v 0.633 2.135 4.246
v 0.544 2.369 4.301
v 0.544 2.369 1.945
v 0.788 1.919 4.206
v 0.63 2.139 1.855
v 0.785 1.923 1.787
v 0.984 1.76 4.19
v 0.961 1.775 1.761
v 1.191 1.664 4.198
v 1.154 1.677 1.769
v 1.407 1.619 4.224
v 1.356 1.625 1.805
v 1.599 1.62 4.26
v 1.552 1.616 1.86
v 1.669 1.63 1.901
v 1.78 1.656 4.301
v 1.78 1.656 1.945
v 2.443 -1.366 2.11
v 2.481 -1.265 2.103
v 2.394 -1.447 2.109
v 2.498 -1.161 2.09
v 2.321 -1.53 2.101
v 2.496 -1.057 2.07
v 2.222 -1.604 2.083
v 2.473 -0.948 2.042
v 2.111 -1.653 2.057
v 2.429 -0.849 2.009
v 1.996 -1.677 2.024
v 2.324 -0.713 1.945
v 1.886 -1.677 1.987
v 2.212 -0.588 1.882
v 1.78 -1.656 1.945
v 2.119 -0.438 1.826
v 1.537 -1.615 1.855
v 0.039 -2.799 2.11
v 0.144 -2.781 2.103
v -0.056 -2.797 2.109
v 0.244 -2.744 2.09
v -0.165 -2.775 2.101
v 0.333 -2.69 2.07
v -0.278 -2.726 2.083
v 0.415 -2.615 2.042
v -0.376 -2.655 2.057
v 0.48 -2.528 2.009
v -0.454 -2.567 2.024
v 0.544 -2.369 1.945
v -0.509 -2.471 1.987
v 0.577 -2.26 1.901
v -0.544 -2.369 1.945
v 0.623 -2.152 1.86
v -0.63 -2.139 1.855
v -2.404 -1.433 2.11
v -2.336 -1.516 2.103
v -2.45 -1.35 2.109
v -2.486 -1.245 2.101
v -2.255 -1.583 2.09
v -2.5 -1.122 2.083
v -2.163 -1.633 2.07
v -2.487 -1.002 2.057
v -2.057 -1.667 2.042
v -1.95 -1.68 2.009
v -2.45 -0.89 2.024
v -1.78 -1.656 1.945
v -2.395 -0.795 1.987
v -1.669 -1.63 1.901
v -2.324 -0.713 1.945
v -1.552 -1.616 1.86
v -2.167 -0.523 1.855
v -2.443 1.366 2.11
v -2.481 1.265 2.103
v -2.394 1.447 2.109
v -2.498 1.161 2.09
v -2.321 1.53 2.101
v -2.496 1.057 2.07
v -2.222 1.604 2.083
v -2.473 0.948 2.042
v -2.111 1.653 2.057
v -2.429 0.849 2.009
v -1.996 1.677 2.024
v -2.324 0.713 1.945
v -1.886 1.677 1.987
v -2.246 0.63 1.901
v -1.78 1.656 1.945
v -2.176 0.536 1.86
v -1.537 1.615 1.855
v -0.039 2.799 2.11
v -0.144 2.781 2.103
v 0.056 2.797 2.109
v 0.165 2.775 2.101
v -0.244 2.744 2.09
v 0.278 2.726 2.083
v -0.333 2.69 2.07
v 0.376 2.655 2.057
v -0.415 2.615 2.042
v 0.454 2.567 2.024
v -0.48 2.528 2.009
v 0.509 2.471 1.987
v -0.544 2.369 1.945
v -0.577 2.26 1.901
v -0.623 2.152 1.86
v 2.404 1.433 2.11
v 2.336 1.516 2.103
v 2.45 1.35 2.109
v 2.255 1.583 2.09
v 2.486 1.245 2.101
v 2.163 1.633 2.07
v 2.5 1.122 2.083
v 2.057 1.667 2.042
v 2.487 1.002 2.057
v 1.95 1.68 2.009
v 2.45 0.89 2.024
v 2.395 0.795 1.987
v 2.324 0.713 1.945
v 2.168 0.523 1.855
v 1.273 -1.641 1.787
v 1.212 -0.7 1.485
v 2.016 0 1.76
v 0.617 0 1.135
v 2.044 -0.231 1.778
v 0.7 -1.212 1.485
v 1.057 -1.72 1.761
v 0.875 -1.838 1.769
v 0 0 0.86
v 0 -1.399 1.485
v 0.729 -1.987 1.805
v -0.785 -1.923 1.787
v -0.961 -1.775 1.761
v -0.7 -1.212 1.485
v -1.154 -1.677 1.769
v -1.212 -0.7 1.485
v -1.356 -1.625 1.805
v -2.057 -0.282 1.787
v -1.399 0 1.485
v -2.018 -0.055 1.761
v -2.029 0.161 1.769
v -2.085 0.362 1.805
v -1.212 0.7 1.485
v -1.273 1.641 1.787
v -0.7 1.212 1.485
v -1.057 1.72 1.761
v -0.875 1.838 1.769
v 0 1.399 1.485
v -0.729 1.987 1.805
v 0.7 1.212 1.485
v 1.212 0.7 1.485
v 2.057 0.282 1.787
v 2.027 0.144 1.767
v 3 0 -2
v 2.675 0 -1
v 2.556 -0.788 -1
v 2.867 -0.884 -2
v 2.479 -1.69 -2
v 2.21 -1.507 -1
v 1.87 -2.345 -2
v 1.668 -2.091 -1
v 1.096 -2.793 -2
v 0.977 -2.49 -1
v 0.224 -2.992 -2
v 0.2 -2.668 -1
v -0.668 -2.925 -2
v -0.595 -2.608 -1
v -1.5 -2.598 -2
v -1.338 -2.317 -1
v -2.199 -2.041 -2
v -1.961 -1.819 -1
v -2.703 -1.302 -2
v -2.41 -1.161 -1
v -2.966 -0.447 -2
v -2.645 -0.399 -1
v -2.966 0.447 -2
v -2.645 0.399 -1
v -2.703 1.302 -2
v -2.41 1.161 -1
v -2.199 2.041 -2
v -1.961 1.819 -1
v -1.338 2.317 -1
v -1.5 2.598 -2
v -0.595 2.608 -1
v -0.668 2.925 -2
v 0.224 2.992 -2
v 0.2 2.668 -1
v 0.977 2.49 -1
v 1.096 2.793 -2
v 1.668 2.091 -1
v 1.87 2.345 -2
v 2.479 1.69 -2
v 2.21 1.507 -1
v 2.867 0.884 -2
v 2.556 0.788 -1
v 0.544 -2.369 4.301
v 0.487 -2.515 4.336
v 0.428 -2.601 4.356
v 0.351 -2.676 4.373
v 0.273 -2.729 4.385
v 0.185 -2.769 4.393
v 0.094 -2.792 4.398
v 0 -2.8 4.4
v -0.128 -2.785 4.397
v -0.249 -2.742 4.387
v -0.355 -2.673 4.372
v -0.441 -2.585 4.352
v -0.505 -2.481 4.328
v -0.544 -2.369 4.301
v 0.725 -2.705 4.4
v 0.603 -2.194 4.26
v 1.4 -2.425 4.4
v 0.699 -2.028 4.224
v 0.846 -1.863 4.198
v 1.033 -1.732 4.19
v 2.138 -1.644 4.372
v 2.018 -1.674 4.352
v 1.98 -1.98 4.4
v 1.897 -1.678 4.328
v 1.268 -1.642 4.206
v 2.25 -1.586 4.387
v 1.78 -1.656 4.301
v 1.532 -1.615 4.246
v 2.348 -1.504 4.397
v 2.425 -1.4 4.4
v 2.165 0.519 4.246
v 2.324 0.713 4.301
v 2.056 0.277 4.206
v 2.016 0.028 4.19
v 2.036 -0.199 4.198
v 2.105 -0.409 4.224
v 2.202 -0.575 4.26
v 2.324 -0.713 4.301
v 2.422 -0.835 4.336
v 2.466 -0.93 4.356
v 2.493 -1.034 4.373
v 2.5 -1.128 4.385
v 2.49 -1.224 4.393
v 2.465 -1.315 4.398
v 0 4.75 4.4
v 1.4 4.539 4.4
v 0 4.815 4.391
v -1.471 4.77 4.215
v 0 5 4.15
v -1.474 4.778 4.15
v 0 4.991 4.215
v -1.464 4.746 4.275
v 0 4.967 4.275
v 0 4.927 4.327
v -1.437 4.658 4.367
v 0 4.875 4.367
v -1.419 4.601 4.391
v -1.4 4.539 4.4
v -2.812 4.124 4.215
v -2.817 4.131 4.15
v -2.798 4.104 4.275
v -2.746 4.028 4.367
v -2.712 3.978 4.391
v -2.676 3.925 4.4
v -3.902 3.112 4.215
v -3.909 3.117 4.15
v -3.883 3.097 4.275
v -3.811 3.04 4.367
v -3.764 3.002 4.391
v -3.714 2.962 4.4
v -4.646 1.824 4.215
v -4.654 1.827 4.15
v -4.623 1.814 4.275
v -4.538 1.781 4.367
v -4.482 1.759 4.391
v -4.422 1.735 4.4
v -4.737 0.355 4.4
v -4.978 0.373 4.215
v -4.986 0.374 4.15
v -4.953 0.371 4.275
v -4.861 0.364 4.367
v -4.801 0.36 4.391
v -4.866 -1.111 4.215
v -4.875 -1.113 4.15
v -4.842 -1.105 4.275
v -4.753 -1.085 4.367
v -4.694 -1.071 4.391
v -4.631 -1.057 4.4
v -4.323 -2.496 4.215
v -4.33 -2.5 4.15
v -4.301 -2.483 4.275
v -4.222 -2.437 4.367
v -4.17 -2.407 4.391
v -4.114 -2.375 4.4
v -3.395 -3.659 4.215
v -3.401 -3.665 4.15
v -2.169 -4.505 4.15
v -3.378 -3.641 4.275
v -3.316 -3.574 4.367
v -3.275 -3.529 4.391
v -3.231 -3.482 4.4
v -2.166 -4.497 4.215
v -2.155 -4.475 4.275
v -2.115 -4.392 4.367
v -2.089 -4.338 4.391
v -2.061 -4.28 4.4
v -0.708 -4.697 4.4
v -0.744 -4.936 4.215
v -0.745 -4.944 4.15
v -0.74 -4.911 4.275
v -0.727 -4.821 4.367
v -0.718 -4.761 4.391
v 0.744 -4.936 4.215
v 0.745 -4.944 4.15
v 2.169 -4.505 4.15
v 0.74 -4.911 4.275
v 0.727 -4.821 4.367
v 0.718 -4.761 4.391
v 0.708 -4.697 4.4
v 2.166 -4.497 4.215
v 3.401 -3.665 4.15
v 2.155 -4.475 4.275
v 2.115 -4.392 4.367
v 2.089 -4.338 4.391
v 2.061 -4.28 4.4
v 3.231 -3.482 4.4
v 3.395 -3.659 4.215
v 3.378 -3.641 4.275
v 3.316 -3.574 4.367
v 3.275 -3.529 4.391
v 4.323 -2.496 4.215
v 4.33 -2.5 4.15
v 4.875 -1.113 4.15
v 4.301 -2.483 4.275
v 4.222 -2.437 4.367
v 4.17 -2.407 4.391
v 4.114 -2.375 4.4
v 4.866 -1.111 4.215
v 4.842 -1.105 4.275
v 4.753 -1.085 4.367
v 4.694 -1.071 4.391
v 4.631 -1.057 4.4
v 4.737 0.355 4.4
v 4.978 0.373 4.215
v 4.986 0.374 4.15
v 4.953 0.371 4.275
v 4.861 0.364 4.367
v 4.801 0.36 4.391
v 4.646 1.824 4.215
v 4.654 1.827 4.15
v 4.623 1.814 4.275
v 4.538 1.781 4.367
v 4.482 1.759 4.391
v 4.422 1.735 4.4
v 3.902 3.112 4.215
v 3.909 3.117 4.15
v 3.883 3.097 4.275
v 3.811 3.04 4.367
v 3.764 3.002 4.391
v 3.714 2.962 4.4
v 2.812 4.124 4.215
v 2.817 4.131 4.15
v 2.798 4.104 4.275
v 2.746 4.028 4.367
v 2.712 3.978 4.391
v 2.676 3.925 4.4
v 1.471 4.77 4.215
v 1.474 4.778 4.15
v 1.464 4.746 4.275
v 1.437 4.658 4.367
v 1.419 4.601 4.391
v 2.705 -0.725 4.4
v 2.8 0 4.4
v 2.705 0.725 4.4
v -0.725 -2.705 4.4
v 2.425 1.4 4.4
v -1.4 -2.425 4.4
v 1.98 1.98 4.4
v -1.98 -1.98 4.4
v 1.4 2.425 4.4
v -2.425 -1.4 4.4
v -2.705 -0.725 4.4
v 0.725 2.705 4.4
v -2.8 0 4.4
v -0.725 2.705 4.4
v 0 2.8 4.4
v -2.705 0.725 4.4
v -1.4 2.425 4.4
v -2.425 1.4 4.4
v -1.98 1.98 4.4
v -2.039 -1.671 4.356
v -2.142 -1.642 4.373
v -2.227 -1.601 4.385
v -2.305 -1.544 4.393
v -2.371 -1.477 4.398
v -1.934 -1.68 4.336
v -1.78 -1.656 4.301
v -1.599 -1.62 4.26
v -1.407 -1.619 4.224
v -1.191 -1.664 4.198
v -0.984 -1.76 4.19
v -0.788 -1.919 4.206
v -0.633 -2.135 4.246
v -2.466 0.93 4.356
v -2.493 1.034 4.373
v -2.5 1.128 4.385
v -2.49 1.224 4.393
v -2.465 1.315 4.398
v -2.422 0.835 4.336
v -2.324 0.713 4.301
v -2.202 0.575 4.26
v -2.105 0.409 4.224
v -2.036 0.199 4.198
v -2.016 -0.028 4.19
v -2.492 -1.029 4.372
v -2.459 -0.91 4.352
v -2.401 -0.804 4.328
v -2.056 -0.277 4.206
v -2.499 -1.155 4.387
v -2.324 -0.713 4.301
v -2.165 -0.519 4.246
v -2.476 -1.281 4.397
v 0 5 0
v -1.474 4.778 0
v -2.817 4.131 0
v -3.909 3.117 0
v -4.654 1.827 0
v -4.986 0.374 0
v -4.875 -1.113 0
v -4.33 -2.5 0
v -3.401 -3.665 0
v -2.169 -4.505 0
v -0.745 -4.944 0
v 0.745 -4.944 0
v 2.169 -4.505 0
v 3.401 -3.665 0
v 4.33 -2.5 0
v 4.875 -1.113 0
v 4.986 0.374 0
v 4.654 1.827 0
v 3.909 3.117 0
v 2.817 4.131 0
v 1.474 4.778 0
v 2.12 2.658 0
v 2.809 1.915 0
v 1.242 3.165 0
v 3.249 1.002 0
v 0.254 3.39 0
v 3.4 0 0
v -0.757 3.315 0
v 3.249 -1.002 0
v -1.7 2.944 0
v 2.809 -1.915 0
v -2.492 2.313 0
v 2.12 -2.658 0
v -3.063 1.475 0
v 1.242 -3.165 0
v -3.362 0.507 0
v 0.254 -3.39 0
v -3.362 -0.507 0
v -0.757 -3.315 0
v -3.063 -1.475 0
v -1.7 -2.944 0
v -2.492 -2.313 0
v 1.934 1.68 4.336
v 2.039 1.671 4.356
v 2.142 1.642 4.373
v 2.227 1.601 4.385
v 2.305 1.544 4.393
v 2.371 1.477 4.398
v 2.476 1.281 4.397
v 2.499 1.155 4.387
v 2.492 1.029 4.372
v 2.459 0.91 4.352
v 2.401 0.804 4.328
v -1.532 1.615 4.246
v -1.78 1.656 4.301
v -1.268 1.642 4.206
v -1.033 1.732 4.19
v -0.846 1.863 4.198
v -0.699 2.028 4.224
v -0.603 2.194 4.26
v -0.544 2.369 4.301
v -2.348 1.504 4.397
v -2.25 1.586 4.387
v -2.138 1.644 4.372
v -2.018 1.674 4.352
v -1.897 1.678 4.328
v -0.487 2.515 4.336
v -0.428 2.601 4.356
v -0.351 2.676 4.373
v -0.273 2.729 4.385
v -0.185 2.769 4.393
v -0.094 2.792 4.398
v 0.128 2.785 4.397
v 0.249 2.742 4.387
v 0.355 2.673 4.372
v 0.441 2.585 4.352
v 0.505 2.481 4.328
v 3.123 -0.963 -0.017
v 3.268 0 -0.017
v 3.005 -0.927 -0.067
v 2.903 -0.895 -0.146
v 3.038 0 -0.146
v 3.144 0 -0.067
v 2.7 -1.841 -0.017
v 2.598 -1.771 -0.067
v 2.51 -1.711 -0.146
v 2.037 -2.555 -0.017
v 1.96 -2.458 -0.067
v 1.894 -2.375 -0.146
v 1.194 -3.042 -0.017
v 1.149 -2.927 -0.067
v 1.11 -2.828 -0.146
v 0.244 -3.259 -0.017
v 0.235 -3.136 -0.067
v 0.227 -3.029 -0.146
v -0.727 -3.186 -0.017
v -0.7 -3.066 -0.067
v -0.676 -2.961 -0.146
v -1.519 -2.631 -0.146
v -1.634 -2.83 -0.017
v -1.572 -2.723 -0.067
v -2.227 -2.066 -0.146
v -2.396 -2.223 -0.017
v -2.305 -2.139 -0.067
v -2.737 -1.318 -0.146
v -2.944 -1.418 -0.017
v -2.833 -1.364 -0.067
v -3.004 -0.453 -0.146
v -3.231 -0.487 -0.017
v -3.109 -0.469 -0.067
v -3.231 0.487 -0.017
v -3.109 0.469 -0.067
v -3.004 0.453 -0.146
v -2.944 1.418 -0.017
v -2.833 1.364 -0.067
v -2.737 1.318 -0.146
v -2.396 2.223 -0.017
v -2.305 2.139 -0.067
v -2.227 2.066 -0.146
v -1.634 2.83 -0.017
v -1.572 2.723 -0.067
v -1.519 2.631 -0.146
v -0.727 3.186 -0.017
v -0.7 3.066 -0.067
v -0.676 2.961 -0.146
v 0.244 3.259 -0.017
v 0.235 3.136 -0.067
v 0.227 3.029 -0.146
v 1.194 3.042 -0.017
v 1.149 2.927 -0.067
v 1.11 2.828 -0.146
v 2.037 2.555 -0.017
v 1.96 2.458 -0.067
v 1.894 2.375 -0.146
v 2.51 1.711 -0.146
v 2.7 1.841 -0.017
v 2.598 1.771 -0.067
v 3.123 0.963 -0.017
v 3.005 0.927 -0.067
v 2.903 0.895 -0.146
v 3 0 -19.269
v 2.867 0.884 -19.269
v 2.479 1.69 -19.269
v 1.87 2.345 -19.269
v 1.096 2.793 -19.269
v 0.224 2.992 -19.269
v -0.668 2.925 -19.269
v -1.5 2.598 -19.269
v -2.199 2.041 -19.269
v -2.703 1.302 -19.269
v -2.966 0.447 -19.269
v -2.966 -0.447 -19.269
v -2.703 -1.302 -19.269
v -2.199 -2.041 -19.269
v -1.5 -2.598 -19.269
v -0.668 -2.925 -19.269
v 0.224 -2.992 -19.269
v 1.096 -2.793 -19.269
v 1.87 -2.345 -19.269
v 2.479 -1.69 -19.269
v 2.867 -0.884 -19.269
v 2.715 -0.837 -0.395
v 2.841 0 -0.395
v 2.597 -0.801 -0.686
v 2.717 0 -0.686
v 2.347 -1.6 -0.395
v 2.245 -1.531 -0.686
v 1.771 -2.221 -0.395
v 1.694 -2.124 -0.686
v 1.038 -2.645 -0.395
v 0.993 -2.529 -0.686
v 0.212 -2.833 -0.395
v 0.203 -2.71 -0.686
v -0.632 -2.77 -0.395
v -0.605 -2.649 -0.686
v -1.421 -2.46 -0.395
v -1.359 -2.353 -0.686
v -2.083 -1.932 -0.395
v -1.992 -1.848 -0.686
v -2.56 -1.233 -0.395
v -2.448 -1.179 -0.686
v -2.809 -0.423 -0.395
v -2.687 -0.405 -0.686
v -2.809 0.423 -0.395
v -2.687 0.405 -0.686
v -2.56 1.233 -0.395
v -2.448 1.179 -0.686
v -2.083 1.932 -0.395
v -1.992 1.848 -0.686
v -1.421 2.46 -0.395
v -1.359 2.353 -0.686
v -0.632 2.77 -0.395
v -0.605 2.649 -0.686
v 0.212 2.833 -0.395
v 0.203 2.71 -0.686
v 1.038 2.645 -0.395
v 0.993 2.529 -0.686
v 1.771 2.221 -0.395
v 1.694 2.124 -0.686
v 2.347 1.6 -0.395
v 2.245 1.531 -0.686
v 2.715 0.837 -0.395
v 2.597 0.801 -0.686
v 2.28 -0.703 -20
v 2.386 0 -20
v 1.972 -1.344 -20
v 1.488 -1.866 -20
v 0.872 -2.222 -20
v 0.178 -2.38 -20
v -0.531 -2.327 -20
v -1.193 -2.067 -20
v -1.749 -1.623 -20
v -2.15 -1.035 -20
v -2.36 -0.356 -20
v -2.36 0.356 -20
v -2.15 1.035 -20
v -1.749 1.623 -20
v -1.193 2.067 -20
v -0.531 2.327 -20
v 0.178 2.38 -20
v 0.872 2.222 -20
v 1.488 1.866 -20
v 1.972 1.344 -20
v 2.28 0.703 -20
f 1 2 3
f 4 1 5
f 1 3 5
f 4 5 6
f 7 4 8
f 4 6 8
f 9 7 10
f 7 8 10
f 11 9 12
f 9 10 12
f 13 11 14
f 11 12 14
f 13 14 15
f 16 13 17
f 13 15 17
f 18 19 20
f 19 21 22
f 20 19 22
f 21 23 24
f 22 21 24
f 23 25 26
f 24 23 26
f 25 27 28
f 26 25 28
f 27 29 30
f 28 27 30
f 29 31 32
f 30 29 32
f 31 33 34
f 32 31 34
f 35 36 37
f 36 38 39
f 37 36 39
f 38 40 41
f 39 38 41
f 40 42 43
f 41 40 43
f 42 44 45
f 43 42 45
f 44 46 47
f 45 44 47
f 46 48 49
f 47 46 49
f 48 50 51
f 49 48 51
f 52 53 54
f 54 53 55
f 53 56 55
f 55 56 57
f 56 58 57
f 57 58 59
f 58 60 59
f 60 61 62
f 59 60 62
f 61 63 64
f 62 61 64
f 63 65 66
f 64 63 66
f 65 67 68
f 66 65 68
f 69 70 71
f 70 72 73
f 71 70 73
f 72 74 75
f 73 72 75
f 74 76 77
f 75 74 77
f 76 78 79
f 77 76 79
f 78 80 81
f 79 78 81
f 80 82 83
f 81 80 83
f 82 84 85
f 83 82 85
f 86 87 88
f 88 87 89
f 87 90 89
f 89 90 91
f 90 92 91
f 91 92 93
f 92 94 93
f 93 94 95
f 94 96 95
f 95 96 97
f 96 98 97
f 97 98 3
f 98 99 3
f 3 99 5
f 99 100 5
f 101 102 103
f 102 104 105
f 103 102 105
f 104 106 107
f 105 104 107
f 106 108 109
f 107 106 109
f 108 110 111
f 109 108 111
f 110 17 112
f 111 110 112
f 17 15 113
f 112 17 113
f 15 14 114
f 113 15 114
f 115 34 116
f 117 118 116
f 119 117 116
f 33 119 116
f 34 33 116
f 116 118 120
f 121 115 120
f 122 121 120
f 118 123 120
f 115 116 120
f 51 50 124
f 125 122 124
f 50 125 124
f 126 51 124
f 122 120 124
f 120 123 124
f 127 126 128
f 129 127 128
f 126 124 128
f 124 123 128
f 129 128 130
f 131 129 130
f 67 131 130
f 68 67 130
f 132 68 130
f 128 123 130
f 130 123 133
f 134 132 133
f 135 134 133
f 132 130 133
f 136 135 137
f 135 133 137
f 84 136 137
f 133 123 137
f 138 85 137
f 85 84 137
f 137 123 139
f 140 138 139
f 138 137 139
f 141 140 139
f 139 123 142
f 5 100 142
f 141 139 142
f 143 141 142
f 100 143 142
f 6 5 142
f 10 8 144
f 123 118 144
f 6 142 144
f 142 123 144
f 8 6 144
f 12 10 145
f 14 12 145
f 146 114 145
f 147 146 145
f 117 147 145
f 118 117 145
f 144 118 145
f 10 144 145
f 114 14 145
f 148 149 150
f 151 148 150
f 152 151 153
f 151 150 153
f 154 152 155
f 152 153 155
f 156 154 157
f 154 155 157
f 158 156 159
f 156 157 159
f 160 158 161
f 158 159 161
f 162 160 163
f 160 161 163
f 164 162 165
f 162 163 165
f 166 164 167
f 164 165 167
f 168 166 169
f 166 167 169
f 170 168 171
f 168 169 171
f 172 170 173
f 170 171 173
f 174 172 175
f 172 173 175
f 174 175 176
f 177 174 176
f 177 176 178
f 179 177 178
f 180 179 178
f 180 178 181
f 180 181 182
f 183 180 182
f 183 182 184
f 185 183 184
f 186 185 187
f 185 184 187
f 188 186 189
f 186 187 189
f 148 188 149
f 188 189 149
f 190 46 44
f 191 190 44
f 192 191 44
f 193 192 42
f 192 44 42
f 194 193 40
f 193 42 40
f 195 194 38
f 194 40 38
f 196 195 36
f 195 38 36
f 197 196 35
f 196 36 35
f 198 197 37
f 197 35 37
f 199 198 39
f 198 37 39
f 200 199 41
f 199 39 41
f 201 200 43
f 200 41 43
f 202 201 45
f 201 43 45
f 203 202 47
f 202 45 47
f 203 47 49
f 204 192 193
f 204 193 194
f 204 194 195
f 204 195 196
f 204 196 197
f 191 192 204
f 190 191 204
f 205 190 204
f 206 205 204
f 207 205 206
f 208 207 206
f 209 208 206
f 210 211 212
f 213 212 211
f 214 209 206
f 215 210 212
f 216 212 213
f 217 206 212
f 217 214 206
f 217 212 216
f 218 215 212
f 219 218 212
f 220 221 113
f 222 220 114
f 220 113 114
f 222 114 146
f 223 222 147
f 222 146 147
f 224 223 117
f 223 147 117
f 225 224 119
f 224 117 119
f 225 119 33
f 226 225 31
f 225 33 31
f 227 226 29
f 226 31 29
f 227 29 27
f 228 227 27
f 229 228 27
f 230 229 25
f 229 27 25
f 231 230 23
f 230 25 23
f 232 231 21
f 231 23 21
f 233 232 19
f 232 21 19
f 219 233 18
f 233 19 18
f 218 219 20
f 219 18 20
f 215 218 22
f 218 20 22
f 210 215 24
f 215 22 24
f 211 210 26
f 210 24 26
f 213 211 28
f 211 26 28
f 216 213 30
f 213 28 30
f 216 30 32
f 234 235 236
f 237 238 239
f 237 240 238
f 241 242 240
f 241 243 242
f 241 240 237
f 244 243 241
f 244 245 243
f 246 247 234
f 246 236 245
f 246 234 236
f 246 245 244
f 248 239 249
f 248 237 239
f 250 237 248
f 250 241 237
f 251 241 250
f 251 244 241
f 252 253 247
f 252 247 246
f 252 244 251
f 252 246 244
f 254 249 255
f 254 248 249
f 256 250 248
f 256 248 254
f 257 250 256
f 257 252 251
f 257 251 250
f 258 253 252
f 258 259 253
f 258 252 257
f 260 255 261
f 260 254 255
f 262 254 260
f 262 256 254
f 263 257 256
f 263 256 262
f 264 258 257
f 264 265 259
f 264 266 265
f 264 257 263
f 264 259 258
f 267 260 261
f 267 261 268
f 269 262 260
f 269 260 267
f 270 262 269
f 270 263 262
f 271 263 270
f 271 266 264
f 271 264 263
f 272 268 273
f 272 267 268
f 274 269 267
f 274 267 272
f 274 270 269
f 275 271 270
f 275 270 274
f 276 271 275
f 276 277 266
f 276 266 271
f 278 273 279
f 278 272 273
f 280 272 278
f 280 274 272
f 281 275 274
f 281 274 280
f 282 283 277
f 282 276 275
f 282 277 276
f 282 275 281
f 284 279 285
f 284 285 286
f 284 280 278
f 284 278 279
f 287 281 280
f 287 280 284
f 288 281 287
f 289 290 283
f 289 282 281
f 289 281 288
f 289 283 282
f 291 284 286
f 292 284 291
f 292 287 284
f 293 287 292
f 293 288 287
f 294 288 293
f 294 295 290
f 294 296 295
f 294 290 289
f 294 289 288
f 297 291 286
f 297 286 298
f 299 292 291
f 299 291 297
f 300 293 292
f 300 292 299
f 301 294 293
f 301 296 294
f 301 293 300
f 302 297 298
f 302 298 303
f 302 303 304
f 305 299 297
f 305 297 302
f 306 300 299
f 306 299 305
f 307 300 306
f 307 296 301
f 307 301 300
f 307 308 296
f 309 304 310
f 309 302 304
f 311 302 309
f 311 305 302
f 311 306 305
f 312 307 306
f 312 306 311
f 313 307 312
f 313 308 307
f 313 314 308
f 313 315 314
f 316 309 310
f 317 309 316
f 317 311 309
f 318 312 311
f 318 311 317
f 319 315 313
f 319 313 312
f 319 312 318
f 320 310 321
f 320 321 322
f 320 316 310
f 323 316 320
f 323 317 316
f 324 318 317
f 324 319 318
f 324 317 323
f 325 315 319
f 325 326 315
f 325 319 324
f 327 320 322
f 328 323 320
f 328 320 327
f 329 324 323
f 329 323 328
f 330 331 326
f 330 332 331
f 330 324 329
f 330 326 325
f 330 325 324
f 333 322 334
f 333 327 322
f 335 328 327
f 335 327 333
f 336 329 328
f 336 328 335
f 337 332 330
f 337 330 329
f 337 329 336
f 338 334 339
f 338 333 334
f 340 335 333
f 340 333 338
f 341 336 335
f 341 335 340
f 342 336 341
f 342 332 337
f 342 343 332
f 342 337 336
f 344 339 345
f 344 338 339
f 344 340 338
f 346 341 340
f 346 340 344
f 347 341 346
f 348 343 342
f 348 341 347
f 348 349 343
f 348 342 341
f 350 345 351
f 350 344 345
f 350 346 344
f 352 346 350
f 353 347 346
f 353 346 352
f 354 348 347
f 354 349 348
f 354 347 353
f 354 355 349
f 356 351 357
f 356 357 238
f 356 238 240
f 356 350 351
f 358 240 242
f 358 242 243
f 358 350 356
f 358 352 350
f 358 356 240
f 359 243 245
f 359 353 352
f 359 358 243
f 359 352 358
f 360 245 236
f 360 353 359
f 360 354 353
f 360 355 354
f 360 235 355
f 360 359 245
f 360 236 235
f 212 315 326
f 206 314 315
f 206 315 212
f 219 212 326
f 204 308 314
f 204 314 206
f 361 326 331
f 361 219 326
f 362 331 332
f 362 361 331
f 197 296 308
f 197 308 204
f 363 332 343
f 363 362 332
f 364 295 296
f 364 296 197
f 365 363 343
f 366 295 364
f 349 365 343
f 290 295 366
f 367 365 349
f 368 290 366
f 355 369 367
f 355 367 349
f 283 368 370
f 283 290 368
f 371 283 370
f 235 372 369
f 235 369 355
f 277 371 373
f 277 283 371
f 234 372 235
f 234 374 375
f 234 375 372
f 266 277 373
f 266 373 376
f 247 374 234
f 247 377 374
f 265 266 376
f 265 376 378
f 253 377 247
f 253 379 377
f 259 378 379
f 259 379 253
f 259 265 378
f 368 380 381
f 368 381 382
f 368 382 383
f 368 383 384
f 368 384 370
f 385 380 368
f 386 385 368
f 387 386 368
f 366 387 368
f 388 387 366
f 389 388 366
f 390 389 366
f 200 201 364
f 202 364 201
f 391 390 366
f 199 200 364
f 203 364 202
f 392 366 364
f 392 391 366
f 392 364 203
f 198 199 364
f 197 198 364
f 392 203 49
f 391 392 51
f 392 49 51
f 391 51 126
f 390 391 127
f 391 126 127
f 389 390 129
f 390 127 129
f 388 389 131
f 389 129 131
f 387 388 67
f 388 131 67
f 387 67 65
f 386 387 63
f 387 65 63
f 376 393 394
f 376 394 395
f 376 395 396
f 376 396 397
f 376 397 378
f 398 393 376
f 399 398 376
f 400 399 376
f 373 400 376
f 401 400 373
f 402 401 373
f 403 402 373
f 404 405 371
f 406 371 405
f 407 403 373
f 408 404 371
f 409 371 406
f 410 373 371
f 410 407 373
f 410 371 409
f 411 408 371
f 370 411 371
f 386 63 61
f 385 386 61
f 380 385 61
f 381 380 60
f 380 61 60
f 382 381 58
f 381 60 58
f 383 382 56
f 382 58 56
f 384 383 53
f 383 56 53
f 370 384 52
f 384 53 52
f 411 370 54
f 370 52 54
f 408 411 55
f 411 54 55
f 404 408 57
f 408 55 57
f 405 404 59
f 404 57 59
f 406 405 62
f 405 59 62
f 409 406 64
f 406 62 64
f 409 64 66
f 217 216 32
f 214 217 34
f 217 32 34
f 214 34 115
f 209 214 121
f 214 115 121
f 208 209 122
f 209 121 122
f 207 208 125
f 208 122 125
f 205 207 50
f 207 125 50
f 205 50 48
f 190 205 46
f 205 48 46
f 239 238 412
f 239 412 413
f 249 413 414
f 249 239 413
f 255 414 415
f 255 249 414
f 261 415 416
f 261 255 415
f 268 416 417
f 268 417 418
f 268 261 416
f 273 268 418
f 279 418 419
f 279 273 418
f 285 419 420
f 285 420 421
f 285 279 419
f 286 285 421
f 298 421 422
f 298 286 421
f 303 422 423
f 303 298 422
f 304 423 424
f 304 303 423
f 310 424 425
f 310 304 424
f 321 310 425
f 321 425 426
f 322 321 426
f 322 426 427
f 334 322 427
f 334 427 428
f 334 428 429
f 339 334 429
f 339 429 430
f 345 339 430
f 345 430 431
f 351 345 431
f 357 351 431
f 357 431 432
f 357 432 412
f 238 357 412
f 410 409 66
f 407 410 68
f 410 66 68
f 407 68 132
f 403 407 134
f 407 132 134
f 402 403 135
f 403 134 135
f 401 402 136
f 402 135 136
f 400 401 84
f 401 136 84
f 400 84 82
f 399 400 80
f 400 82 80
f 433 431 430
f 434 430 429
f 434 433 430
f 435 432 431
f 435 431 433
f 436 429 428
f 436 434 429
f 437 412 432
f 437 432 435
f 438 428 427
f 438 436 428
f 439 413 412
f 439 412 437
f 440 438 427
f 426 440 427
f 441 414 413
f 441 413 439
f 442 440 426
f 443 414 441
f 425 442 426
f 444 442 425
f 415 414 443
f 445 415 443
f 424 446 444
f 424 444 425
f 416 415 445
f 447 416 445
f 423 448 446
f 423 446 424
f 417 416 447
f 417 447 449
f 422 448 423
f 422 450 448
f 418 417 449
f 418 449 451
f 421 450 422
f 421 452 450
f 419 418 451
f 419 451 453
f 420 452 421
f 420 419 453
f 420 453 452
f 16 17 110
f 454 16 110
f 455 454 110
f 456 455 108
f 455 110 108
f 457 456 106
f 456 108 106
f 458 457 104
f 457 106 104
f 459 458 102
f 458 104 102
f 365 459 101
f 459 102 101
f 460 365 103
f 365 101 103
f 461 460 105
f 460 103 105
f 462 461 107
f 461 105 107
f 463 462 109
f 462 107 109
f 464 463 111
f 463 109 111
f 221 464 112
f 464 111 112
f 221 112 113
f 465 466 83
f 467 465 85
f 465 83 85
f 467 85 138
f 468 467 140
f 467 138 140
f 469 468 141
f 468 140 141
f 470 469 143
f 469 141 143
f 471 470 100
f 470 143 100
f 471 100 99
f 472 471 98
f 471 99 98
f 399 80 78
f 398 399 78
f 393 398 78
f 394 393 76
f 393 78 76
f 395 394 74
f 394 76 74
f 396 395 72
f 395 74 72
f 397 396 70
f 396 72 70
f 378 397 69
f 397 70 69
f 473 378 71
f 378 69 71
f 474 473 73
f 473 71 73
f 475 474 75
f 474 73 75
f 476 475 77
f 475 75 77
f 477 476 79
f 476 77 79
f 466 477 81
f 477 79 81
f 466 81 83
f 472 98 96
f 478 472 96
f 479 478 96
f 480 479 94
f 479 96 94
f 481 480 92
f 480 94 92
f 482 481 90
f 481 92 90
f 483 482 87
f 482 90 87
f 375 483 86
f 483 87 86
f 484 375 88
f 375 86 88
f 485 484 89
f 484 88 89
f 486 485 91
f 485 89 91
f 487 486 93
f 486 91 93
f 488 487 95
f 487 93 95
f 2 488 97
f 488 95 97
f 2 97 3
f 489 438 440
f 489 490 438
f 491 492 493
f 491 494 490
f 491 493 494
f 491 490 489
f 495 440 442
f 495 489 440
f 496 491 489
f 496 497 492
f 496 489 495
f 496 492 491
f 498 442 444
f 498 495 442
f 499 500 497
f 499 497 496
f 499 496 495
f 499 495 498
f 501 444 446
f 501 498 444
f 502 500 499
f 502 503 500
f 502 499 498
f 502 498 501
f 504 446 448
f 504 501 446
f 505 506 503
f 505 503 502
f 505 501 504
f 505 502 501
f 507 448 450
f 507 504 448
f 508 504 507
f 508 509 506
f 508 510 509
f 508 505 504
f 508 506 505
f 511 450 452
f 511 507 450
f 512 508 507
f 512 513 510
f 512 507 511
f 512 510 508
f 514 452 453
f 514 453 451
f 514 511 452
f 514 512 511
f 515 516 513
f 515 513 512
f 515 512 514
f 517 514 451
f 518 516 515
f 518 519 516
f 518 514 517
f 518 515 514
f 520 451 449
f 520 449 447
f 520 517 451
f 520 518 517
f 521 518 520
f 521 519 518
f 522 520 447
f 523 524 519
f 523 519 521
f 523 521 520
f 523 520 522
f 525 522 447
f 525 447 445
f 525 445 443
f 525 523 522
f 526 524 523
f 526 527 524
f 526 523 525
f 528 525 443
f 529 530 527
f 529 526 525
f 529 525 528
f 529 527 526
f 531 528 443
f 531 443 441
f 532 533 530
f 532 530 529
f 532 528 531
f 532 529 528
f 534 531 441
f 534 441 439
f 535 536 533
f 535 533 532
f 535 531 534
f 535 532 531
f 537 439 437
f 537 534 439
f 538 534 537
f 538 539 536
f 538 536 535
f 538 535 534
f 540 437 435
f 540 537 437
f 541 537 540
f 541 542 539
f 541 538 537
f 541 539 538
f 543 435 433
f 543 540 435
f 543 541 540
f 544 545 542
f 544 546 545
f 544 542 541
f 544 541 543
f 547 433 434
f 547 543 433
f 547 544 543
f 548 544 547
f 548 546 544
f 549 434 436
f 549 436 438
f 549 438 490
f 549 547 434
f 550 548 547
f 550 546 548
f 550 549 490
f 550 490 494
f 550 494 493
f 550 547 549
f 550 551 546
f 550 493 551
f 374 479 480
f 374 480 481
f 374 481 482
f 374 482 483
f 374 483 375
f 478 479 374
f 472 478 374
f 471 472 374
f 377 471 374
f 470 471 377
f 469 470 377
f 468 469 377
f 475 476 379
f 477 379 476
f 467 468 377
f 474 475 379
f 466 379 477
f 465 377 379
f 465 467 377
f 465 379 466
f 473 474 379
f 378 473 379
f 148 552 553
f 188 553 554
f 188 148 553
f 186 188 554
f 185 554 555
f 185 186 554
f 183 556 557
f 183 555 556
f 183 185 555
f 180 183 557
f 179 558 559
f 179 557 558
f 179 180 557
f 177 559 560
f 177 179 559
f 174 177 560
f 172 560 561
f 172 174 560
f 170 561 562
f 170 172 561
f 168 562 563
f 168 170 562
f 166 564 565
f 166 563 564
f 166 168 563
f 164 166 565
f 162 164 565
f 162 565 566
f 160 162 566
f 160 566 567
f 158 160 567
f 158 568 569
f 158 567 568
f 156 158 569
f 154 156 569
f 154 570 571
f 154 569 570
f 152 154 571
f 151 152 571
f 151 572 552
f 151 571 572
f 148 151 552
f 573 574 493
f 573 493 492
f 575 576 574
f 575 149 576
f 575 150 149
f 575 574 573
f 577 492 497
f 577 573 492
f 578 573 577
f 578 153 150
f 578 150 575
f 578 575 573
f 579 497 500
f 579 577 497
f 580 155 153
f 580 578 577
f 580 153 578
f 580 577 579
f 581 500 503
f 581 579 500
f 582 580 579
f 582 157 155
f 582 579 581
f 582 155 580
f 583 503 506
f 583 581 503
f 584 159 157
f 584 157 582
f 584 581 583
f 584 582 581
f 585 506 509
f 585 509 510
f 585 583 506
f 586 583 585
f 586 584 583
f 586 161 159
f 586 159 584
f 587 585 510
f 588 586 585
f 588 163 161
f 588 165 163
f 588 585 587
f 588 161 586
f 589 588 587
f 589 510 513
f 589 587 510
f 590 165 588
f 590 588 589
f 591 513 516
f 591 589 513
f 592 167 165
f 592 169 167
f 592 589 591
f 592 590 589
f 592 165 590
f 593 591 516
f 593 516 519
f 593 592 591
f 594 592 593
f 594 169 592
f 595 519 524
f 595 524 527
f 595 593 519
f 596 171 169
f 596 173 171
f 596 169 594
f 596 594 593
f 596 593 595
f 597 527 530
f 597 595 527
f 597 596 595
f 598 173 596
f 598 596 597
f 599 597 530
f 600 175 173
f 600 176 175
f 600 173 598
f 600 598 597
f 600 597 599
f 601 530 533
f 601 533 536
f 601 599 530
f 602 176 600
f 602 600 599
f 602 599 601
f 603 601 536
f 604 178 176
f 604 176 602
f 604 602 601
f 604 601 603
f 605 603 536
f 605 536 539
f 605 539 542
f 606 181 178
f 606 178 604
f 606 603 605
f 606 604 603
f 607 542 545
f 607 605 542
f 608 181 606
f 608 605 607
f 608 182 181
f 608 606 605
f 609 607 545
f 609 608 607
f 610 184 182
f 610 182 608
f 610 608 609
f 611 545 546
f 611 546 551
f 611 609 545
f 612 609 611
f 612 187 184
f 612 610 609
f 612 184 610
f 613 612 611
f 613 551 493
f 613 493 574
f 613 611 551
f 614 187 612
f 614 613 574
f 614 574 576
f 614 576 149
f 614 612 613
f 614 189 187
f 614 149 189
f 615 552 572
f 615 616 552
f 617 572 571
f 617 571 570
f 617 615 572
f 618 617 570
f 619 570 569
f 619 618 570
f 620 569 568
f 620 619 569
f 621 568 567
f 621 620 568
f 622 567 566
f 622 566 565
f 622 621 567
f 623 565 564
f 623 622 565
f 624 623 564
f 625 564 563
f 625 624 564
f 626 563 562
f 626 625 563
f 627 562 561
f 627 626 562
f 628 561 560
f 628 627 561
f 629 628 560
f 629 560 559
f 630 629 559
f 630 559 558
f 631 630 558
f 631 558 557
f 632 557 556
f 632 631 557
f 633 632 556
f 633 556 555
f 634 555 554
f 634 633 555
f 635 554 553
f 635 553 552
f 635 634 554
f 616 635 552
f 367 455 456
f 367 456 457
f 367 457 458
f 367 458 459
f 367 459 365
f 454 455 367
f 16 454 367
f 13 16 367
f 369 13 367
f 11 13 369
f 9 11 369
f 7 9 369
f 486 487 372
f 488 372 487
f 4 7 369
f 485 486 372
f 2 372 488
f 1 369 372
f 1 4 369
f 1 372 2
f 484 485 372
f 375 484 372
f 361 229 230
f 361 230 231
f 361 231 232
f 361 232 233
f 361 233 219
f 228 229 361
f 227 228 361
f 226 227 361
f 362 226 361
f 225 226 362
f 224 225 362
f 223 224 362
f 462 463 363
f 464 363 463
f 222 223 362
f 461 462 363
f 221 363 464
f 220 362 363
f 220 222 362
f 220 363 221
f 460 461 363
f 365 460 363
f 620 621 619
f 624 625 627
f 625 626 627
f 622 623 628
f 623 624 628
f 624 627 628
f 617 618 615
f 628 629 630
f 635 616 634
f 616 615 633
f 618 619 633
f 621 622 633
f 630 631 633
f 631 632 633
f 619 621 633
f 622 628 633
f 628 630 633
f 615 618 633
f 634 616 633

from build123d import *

# Parameters (mm, degrees)
SOCKET_CUT_EXTRUDE1_START  = -3.54
SOCKET_CUT_EXTRUDE1_DEPTH  = 3.54
SKETCH13_R                 = 3
LENGTH_BOSS_EXTRUDE1_DEPTH = 20


with BuildPart() as part:
    # Sketch8 → Head-Revolve1 (revolve)
    with BuildSketch(Plane(origin=(0, 0, 0), x_dir=(0, 0, -1), z_dir=(1, 0, 0))):
        with BuildLine():
            Line((-4.4, 4.75), (-4.4, 2.8))
            Line((-4.4, 2.8), (-4.189927833, 2.016))
            Line((-4.189927833, 2.016), (-4.189927833, 0))
            Line((-4.189927833, 0), (0, 0))
            Line((0, 0), (0, 5))
            Line((0, 5), (-4.15, 5))
            ThreePointArc((-4.15, 5), (-4.326776695, 4.926776695), (-4.4, 4.75))
        make_face()
    revolve(axis=Axis((0, 0, 0), (0, 0, 1)))

    # Sketch9 → socket-Cut-Extrude1 (cut)
    with BuildSketch(Plane.XY.offset(4.4).offset(SOCKET_CUT_EXTRUDE1_START)):
        with BuildLine():
            ThreePointArc((0.544244974, 2.369331508), (1.008, 1.745907214), (1.779778789, 1.655995727))
            ThreePointArc((1.779778789, 1.655995727), (2.424871131, 1.4), (2.324023763, 0.713335781))
            ThreePointArc((2.324023763, 0.713335781), (2.016, 0), (2.324023763, -0.713335781))
            ThreePointArc((2.324023763, -0.713335781), (2.424871131, -1.4), (1.779778789, -1.655995727))
            ThreePointArc((1.779778789, -1.655995727), (1.008, -1.745907214), (0.544244974, -2.369331508))
            ThreePointArc((0.544244974, -2.369331508), (0, -2.8), (-0.544244974, -2.369331508))
            ThreePointArc((-0.544244974, -2.369331508), (-1.008, -1.745907214), (-1.779778789, -1.655995727))
            ThreePointArc((-1.779778789, -1.655995727), (-2.424871131, -1.4), (-2.324023763, -0.713335781))
            ThreePointArc((-2.324023763, -0.713335781), (-2.016, 0), (-2.324023763, 0.713335781))
            ThreePointArc((-2.324023763, 0.713335781), (-2.424871131, 1.4), (-1.779778789, 1.655995727))
            ThreePointArc((-1.779778789, 1.655995727), (-1.008, 1.745907214), (-0.544244974, 2.369331508))
            ThreePointArc((-0.544244974, 2.369331508), (0, 2.8), (0.544244974, 2.369331508))
        make_face()
    extrude(amount=SOCKET_CUT_EXTRUDE1_DEPTH, mode=Mode.SUBTRACT)

    # Sketch12 → Socket-Revolve2 (revolve)
    with BuildSketch(Plane(origin=(0, 0, 0), x_dir=(0, 0, -1), z_dir=(1, 0, 0)), mode=Mode.PRIVATE) as socket_revolve2_sk:
        Polygon((-2.11, 5), (-2.11, 2.8), (-0.86, 0), (0, 0), (0, 5), align=None)
    revolve(socket_revolve2_sk.sketch.rotate(Axis((0, 0, 0), (0, 0, -1)), 90), axis=Axis((0, 0, 0), (0, 0, -1)))

    # Sketch13 → Length-Boss-Extrude1 (add)
    with BuildSketch(Plane.XY):
        Circle(SKETCH13_R)
    extrude(amount=-LENGTH_BOSS_EXTRUDE1_DEPTH)

    # Sketch14 → Runout-Cut-Revolve1 (revolve, cut)
    with BuildSketch(Plane(origin=(0, 0, 0), x_dir=(0, 0, -1), z_dir=(1, 0, 0)), mode=Mode.PRIVATE) as runout_cut_revolve1_sk:
        Polygon((0, 3), (2, 3), (1, 2.675), (0, 2.675), align=None)
    revolve(runout_cut_revolve1_sk.sketch.rotate(Axis((0, 0, 0), (0, 0, -1)), 90), axis=Axis((0, 0, 0), (0, 0, -1)), mode=Mode.SUBTRACT)

    # Sketch15 → Fillet-Revolve3 (revolve)
    with BuildSketch(Plane(origin=(0, 0, 0), x_dir=(0, 0, -1), z_dir=(1, 0, 0)), mode=Mode.PRIVATE) as fillet_revolve3_sk:
        with BuildLine():
            ThreePointArc((0.146390721, 3.0375), (0.536304234, 2.769379359), (1, 2.675))
            Line((1, 2.675), (0, 2.675))
            Line((0, 2.675), (0, 3.4))
            ThreePointArc((0, 3.4), (0.037979272, 3.204528459), (0.146390721, 3.0375))
        make_face()
    revolve(fillet_revolve3_sk.sketch.rotate(Axis((0, 0, 0), (0, 0, -1)), 90), axis=Axis((0, 0, 0), (0, 0, -1)))

    # Sketch16 → Chamfer-Cut-Revolve2 (revolve, cut)
    with BuildSketch(Plane(origin=(0, 0, 0), x_dir=(0, 0, -1), z_dir=(1, 0, 0)), mode=Mode.PRIVATE) as chamfer_cut_revolve2_sk:
        Polygon((20, 3), (19.268859171, 3), (20, 2.3865), align=None)
    revolve(chamfer_cut_revolve2_sk.sketch.rotate(Axis((0, 0, 0), (0, 0, -1)), 90), axis=Axis((0, 0, 0), (0, 0, -1)), mode=Mode.SUBTRACT)


solid = part.part
